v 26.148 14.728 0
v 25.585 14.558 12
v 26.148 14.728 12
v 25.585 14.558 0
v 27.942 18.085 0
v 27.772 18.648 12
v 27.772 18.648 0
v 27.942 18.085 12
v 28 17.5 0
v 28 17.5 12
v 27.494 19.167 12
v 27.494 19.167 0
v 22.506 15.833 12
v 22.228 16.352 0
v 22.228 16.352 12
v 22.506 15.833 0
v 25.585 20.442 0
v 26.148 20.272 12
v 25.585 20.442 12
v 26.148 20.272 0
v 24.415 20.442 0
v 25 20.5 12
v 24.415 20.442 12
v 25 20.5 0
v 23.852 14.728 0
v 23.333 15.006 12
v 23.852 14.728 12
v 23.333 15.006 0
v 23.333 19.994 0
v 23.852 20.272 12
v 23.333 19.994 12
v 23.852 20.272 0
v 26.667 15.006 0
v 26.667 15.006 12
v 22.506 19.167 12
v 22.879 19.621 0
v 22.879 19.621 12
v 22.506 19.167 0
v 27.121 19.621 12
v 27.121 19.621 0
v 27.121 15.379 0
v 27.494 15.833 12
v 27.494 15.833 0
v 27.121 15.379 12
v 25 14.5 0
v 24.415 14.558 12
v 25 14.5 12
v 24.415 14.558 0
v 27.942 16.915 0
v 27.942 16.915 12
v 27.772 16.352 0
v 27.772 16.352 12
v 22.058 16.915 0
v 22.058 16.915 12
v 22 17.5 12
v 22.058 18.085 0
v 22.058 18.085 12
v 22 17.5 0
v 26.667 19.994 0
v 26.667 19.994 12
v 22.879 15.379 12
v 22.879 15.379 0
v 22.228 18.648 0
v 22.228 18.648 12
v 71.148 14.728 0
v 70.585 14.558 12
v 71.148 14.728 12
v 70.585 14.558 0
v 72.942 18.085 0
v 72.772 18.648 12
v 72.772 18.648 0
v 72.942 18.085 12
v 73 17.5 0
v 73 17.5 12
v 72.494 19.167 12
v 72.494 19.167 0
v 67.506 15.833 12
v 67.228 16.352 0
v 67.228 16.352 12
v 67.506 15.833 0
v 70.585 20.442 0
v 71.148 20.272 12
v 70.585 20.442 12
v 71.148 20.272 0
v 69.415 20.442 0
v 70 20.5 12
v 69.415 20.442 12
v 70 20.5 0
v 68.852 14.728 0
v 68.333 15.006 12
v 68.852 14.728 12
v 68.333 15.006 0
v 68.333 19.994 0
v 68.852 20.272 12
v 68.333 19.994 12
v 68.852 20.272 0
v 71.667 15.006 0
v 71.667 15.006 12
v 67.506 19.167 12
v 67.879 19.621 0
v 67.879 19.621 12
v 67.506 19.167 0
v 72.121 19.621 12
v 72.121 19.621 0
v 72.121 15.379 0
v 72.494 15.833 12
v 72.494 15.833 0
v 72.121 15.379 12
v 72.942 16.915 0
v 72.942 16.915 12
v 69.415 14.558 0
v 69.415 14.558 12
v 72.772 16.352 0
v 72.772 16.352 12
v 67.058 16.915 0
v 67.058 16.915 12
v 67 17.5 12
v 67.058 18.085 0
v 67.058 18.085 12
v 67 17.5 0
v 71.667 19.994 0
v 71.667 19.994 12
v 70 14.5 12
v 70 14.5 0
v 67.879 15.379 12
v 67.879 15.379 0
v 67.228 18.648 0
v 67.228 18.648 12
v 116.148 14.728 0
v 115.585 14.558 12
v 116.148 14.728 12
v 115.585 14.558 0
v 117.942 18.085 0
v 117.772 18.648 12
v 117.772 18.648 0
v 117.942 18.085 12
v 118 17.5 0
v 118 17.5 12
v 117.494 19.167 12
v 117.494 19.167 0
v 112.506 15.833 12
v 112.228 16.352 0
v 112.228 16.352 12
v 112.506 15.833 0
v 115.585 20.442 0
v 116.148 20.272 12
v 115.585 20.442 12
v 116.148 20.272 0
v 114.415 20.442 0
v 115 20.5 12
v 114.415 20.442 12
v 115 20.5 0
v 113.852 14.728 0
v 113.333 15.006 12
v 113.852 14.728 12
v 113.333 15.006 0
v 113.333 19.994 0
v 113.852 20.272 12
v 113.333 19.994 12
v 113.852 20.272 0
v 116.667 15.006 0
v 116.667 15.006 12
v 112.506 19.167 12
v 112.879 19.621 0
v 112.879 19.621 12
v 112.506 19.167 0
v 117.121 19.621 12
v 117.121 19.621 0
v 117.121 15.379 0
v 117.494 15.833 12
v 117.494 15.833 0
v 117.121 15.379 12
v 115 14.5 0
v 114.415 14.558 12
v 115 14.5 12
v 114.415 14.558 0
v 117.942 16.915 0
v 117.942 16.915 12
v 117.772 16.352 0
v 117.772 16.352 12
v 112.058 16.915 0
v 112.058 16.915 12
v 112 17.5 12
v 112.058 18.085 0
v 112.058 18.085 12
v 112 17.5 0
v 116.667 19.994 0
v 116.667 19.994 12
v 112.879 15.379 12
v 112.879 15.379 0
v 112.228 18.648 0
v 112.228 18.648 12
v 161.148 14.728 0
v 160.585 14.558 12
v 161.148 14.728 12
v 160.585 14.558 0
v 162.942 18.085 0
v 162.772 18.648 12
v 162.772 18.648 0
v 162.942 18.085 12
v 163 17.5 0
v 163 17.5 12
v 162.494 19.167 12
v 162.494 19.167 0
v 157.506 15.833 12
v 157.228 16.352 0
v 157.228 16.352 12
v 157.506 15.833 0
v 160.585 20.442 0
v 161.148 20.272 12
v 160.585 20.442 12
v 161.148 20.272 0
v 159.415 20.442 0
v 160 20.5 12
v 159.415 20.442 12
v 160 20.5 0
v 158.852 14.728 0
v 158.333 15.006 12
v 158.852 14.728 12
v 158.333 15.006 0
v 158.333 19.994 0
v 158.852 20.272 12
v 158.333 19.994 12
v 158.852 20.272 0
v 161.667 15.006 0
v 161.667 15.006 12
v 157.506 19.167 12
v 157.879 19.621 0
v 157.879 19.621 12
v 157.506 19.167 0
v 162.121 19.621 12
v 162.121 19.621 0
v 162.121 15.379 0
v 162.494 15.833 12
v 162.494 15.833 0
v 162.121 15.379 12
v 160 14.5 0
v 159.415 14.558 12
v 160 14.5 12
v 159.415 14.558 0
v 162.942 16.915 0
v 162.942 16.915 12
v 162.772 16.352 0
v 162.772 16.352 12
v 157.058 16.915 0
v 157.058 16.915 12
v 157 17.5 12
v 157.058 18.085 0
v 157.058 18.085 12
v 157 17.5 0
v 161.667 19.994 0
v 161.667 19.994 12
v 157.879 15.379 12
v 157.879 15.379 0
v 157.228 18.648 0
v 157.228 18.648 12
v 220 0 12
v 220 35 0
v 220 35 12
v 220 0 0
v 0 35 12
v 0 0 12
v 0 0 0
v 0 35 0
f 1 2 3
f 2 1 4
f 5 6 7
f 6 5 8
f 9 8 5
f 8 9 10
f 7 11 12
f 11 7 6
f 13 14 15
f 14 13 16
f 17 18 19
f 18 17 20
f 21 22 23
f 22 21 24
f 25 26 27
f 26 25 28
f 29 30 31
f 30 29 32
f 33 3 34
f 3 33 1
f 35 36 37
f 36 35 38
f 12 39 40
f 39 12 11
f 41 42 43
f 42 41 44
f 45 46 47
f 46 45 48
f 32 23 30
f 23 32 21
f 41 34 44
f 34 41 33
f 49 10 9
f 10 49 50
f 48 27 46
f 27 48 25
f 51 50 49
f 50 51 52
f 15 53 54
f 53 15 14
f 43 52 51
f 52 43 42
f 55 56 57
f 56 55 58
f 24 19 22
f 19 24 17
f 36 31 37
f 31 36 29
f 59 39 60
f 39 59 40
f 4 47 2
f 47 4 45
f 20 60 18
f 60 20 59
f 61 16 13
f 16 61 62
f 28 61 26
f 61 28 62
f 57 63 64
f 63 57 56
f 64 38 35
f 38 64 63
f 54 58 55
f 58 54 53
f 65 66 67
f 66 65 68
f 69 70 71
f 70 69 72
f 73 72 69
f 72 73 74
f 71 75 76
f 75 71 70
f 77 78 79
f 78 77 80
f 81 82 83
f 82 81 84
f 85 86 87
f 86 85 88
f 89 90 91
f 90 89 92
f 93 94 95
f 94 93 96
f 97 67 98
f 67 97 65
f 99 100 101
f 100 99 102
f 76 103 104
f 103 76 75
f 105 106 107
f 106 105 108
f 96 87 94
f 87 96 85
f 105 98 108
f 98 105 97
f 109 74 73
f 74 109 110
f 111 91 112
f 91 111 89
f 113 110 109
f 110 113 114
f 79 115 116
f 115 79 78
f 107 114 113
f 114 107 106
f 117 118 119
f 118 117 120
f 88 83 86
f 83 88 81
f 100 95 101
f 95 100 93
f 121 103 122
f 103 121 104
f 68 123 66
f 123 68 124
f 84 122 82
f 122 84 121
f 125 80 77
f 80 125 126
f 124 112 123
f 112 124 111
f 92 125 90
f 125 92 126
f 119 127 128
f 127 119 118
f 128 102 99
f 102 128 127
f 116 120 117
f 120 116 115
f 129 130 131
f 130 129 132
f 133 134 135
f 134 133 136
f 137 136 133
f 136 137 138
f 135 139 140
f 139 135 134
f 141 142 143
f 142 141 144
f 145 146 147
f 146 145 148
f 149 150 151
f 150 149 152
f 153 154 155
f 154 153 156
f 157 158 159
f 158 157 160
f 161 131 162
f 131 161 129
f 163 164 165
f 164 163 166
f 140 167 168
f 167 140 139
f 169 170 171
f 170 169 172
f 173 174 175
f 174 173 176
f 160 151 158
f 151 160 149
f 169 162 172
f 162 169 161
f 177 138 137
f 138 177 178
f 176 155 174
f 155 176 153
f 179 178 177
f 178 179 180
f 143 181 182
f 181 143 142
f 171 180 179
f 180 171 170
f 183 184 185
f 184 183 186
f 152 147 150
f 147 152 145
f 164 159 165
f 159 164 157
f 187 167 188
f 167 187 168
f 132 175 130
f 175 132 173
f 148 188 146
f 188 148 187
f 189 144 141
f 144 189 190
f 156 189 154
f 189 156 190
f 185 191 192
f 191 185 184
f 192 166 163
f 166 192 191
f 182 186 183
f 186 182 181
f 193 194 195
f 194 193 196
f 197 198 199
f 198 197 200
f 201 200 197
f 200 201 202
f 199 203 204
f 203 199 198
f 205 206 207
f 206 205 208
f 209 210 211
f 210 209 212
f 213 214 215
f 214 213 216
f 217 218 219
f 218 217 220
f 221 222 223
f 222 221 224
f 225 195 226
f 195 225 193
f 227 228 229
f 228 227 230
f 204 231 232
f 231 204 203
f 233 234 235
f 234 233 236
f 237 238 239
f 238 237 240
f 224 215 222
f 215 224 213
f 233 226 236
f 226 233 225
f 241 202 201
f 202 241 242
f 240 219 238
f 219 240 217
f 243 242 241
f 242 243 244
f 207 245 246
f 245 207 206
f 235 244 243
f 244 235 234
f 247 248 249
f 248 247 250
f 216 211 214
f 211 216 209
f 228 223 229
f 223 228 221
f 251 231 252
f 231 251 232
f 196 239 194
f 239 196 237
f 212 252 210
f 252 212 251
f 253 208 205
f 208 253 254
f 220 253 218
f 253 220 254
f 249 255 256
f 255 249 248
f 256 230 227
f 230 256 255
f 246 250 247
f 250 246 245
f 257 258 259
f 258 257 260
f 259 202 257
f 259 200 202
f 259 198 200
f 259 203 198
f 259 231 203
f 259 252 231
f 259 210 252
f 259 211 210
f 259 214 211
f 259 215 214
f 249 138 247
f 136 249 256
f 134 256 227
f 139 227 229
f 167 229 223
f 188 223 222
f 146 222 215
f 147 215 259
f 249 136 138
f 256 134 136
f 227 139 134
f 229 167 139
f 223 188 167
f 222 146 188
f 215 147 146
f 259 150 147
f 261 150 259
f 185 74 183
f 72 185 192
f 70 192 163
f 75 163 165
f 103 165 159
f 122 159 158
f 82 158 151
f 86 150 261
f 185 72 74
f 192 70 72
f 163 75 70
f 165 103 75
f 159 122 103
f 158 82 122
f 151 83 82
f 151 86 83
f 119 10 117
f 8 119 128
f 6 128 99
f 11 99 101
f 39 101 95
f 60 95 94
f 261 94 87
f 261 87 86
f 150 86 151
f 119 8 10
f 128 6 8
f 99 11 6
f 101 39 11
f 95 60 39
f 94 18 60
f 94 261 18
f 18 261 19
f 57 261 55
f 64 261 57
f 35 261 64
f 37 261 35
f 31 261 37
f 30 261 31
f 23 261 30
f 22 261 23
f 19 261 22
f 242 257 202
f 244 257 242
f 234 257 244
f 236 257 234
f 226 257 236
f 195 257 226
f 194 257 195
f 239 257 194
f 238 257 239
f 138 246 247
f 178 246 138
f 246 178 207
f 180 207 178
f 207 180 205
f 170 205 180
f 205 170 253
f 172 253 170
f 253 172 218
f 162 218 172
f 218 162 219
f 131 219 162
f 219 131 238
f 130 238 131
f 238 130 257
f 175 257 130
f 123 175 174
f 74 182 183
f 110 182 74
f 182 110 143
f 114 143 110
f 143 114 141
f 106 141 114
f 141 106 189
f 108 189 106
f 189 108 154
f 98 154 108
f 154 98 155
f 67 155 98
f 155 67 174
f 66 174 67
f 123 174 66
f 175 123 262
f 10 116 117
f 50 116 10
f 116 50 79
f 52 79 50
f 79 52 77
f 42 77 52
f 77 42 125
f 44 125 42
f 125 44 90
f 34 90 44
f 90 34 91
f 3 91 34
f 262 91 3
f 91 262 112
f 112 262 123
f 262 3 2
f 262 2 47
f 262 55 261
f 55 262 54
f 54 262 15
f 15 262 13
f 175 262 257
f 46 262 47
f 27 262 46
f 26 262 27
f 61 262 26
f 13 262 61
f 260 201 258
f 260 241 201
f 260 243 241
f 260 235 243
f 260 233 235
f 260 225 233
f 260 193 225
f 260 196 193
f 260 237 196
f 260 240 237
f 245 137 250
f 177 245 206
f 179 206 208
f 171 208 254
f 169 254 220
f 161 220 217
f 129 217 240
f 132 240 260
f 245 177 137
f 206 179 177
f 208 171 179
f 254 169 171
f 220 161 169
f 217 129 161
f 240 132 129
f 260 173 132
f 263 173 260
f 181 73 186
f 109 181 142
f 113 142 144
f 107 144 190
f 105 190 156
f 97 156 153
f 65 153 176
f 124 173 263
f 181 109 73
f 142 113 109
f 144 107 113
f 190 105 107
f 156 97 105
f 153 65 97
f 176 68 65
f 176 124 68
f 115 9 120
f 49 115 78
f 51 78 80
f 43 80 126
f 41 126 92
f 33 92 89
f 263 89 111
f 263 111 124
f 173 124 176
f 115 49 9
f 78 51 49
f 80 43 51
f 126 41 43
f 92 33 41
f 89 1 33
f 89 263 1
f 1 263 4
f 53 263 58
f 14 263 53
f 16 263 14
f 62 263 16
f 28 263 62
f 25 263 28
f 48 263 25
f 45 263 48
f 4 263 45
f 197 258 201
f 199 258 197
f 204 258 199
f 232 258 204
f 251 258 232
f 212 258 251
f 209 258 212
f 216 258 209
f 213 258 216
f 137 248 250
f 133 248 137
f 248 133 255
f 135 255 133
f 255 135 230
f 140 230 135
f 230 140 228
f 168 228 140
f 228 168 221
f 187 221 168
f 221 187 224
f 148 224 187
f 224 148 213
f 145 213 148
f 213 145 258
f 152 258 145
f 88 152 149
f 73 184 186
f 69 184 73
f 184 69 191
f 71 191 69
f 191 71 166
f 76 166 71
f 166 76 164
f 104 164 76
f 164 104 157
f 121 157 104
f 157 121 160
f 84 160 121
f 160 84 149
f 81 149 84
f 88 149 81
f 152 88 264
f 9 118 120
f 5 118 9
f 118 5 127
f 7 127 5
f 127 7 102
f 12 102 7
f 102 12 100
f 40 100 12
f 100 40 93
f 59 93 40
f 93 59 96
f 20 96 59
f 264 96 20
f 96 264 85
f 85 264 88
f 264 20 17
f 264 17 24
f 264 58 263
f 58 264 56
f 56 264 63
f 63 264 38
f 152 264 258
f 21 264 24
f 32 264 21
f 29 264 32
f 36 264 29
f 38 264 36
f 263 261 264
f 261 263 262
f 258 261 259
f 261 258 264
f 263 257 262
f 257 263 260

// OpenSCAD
$fn = 32;

// ----------------------------------------------------------------------
// Long rail: 200-250 mm mounting rail
// ----------------------------------------------------------------------

// --- parameters (mm) ---
rail_l = 220;             // rail length, X
rail_w = 35;              // rail width, Y
rail_t = 12;              // rail thickness, Z
hole_d = 6;               // mounting hole diameter
hole_start = 25;          // first hole offset from the end
hole_pitch = 45;          // hole pitch
holes = 4;                // number of holes

difference() {
  cube([rail_l, rail_w, rail_t]);
  for (i = [0 : holes - 1])
    translate([hole_start + i * hole_pitch, rail_w / 2, -1])
      cylinder(h = rail_t + 2, d = hole_d);
}
